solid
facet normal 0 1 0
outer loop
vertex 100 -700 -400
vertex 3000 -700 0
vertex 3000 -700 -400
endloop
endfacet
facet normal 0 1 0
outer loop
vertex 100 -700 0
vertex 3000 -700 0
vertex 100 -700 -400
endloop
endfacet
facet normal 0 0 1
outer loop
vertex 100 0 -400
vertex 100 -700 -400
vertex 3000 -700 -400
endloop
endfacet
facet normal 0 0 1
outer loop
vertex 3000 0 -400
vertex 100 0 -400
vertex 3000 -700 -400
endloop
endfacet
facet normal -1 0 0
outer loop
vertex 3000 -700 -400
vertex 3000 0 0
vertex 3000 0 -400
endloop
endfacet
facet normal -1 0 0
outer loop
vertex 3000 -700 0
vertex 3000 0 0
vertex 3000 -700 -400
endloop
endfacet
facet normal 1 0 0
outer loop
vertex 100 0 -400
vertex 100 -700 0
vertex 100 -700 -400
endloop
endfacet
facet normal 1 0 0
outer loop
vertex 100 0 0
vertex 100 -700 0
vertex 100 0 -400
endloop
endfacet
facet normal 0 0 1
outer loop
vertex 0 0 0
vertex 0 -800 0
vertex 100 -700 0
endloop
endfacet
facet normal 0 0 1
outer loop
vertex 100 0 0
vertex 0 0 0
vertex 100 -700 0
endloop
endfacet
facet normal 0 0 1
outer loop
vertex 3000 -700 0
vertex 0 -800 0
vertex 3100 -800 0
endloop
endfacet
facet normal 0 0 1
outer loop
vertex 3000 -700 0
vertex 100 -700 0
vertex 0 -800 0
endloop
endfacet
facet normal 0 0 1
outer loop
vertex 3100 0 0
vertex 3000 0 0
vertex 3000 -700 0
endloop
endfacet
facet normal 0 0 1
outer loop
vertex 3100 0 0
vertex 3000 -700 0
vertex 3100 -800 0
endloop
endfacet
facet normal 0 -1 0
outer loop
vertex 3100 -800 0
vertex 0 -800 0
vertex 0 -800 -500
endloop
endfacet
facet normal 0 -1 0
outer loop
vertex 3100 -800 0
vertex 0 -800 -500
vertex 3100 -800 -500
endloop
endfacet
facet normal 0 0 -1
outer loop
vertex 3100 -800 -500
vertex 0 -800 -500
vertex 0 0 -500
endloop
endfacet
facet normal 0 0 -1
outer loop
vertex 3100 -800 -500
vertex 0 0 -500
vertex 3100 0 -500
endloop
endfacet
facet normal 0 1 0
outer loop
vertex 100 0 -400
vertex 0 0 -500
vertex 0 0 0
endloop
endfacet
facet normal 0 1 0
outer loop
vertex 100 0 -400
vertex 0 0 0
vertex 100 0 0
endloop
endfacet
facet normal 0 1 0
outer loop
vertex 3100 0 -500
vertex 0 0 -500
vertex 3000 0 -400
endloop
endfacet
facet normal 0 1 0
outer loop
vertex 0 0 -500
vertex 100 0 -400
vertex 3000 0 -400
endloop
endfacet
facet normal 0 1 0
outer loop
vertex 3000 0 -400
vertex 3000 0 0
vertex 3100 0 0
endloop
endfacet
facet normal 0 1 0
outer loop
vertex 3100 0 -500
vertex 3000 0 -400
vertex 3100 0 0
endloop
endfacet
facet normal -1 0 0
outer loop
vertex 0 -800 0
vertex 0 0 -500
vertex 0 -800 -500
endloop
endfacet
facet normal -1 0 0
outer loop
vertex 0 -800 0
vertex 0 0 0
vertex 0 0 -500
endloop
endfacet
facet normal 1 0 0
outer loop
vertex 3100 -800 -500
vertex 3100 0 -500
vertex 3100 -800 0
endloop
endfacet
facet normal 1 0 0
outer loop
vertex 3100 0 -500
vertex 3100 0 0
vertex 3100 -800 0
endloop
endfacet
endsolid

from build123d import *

# Parameters (mm, degrees)
F1_DEPTH = 400
F2_W     = 3100
F2_H     = 800
F3_DEPTH = 100


with BuildPart() as f1:
    # F0 (on Top) → F1 (new body)
    with BuildSketch(Plane.XY):
        Polygon((100, 0), (0, 0), (0, -800), (3100, -800), (3100, 0), (3000, 0), (3000, -700), (100, -700), align=None)
    extrude(amount=-F1_DEPTH)

    # F2 (on face) → F3 (join)
    with BuildSketch(Plane(origin=(0, 0, -400), x_dir=(1, 0, 0), z_dir=(0, 0, -1))):
        with Locations((1550, 400)):
            Rectangle(F2_W, F2_H)
    extrude(amount=F3_DEPTH)


solid = f1.part
